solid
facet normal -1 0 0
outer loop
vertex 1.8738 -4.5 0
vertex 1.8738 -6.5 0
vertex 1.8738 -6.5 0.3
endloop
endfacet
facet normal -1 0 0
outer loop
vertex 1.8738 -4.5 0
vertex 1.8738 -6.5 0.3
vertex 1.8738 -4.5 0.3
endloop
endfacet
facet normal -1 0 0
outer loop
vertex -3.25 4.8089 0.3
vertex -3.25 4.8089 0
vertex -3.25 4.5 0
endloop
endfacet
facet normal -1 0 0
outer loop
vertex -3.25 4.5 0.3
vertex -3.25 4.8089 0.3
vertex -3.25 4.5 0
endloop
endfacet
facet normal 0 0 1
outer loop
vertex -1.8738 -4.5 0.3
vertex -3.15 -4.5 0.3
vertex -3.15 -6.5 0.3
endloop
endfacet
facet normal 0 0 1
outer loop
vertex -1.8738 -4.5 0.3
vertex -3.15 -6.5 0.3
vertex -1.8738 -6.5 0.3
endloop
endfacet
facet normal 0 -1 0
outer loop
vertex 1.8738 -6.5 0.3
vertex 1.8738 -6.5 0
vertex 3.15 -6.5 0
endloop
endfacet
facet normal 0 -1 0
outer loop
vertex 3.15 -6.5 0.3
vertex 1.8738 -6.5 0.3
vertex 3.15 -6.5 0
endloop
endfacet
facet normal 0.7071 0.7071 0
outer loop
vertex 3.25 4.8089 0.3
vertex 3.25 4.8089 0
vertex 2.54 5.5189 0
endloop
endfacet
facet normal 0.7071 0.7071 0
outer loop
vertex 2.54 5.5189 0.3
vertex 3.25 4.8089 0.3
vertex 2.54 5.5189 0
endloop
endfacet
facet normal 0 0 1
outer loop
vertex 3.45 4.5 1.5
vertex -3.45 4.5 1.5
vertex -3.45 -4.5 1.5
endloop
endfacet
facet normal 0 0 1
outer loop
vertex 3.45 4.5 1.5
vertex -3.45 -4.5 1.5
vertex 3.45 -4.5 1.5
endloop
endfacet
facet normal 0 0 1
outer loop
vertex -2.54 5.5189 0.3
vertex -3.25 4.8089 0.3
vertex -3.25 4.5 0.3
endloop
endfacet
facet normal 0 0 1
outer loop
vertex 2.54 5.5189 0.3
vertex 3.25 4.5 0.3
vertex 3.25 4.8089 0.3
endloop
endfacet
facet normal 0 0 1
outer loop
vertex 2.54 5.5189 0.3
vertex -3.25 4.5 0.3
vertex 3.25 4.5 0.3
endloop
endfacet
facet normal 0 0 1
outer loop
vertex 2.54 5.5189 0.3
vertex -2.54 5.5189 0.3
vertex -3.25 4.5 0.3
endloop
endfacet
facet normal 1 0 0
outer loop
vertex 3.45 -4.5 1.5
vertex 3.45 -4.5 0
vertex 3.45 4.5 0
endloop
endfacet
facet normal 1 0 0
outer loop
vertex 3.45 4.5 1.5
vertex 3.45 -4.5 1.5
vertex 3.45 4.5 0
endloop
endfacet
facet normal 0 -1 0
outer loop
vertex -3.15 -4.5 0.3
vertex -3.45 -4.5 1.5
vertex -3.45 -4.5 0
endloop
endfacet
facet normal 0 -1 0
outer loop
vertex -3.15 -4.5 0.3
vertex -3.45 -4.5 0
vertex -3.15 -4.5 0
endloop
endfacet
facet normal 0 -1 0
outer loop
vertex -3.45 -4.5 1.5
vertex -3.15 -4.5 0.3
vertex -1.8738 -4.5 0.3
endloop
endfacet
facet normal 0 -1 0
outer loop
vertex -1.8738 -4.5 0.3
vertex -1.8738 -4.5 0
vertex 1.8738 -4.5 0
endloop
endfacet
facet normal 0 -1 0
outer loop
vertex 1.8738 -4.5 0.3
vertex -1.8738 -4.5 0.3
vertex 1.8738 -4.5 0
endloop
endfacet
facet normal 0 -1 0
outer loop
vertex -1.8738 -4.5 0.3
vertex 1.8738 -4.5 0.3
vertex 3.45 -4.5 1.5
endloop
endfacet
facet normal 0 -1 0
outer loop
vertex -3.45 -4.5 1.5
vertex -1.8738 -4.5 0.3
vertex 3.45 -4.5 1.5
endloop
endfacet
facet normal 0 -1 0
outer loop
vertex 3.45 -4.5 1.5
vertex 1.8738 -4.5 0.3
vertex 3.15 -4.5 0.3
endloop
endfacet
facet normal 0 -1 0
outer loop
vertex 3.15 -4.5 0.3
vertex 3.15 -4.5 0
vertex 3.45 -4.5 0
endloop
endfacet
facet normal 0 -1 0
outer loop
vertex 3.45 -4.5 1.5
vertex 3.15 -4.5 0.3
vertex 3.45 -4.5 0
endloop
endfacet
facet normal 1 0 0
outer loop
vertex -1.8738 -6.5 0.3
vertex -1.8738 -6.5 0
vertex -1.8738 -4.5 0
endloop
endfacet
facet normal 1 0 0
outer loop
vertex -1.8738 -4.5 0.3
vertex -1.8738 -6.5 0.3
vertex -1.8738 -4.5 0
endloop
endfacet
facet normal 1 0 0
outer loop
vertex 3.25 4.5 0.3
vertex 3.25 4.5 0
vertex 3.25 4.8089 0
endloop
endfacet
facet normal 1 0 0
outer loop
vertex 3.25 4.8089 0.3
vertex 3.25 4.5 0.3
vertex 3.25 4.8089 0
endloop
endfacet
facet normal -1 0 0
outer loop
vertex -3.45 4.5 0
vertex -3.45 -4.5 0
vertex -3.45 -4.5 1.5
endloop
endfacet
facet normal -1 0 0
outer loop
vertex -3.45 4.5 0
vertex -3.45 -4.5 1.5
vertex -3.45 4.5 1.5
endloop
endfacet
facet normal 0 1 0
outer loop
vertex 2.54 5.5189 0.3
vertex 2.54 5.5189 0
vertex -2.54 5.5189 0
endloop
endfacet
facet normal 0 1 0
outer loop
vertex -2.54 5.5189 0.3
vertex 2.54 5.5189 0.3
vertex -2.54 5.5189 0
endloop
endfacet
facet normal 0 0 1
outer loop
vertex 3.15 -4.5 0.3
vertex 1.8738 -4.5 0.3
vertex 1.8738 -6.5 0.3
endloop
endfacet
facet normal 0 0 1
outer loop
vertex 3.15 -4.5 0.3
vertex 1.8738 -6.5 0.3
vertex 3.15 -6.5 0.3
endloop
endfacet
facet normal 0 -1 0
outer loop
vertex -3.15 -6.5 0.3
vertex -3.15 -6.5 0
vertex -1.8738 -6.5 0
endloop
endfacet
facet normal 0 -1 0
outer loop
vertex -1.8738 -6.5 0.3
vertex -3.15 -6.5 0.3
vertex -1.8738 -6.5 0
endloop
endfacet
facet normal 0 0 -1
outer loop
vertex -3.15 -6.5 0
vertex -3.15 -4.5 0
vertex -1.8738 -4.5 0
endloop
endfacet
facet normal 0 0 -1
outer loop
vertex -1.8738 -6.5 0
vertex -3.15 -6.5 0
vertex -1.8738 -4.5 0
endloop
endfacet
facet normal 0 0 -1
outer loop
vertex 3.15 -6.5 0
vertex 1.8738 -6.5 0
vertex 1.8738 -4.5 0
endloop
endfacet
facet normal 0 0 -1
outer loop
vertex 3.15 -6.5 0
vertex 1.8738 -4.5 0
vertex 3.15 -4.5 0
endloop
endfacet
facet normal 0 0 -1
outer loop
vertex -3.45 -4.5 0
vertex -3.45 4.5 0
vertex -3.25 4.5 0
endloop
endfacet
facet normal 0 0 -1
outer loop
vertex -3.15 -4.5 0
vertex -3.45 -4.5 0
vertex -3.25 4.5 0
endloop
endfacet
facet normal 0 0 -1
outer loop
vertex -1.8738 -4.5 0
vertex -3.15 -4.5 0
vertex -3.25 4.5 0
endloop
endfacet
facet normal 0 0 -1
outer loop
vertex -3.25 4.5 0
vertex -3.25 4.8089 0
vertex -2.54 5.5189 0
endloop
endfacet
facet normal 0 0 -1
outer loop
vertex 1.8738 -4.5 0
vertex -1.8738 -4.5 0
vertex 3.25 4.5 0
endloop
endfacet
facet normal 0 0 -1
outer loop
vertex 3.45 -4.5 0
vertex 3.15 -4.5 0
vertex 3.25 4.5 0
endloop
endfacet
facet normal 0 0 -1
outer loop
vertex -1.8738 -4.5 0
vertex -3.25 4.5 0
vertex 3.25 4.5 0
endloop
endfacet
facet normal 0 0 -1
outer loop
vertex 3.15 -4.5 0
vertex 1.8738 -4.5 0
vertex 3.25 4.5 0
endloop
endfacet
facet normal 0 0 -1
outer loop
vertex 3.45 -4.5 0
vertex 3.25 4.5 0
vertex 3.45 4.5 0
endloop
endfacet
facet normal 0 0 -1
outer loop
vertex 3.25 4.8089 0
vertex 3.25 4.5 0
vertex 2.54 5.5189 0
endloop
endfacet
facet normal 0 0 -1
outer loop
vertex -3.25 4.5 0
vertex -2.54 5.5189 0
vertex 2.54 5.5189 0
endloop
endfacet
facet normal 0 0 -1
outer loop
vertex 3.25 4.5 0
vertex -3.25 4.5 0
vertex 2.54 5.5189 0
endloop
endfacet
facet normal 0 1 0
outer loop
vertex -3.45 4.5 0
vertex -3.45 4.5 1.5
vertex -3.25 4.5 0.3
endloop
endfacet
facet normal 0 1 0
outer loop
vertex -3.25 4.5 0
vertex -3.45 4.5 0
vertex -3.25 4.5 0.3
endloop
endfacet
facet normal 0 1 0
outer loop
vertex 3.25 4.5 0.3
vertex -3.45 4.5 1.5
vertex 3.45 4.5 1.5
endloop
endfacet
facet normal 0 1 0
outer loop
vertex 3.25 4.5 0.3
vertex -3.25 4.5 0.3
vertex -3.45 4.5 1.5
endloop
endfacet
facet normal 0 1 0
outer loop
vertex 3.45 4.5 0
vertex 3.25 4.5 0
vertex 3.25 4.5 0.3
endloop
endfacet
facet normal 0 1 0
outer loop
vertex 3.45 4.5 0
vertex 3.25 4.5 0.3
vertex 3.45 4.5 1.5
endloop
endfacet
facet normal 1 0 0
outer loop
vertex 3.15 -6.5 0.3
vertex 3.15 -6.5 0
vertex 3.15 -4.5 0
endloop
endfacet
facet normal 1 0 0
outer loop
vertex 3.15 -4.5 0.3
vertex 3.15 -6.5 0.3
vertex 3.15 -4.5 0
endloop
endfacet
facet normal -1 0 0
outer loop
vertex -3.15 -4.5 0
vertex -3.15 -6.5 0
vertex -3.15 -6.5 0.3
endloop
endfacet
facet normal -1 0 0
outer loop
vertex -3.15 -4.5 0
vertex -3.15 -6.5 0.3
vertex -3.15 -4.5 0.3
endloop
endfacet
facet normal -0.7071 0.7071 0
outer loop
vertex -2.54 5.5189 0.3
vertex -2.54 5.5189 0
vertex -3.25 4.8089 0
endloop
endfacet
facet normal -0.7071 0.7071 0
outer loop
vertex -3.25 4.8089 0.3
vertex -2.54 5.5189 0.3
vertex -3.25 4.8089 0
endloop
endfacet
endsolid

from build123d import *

# Parameters (mm, degrees)
SKETCH1_W           = 6.9
SKETCH1_H           = 9
BOSS_EXTRUDE1_DEPTH = 1.5
SKETCH2_W           = 1.27616984
SKETCH2_H           = 2
BOSS_EXTRUDE2_DEPTH = 0.3


with BuildPart() as part:
    # Sketch1 → Boss-Extrude1 (new body)
    with BuildSketch(Plane.XY):
        Rectangle(SKETCH1_W, SKETCH1_H)
    extrude(amount=BOSS_EXTRUDE1_DEPTH)

    # Sketch2 → Boss-Extrude2 (add)
    with BuildSketch(Plane.XY):
        Polygon((3.25, 4.5), (3.25, 4.808852059), (2.54, 5.518852059), (-2.54, 5.518852059), (-3.25, 4.808852059), (-3.25, 4.5), align=None)
        with Locations((2.51191508, -5.5)):
            Rectangle(SKETCH2_W, SKETCH2_H)
        with Locations((-2.51191508, -5.5)):
            Rectangle(SKETCH2_W, SKETCH2_H)
    extrude(amount=BOSS_EXTRUDE2_DEPTH)


solid = part.part
